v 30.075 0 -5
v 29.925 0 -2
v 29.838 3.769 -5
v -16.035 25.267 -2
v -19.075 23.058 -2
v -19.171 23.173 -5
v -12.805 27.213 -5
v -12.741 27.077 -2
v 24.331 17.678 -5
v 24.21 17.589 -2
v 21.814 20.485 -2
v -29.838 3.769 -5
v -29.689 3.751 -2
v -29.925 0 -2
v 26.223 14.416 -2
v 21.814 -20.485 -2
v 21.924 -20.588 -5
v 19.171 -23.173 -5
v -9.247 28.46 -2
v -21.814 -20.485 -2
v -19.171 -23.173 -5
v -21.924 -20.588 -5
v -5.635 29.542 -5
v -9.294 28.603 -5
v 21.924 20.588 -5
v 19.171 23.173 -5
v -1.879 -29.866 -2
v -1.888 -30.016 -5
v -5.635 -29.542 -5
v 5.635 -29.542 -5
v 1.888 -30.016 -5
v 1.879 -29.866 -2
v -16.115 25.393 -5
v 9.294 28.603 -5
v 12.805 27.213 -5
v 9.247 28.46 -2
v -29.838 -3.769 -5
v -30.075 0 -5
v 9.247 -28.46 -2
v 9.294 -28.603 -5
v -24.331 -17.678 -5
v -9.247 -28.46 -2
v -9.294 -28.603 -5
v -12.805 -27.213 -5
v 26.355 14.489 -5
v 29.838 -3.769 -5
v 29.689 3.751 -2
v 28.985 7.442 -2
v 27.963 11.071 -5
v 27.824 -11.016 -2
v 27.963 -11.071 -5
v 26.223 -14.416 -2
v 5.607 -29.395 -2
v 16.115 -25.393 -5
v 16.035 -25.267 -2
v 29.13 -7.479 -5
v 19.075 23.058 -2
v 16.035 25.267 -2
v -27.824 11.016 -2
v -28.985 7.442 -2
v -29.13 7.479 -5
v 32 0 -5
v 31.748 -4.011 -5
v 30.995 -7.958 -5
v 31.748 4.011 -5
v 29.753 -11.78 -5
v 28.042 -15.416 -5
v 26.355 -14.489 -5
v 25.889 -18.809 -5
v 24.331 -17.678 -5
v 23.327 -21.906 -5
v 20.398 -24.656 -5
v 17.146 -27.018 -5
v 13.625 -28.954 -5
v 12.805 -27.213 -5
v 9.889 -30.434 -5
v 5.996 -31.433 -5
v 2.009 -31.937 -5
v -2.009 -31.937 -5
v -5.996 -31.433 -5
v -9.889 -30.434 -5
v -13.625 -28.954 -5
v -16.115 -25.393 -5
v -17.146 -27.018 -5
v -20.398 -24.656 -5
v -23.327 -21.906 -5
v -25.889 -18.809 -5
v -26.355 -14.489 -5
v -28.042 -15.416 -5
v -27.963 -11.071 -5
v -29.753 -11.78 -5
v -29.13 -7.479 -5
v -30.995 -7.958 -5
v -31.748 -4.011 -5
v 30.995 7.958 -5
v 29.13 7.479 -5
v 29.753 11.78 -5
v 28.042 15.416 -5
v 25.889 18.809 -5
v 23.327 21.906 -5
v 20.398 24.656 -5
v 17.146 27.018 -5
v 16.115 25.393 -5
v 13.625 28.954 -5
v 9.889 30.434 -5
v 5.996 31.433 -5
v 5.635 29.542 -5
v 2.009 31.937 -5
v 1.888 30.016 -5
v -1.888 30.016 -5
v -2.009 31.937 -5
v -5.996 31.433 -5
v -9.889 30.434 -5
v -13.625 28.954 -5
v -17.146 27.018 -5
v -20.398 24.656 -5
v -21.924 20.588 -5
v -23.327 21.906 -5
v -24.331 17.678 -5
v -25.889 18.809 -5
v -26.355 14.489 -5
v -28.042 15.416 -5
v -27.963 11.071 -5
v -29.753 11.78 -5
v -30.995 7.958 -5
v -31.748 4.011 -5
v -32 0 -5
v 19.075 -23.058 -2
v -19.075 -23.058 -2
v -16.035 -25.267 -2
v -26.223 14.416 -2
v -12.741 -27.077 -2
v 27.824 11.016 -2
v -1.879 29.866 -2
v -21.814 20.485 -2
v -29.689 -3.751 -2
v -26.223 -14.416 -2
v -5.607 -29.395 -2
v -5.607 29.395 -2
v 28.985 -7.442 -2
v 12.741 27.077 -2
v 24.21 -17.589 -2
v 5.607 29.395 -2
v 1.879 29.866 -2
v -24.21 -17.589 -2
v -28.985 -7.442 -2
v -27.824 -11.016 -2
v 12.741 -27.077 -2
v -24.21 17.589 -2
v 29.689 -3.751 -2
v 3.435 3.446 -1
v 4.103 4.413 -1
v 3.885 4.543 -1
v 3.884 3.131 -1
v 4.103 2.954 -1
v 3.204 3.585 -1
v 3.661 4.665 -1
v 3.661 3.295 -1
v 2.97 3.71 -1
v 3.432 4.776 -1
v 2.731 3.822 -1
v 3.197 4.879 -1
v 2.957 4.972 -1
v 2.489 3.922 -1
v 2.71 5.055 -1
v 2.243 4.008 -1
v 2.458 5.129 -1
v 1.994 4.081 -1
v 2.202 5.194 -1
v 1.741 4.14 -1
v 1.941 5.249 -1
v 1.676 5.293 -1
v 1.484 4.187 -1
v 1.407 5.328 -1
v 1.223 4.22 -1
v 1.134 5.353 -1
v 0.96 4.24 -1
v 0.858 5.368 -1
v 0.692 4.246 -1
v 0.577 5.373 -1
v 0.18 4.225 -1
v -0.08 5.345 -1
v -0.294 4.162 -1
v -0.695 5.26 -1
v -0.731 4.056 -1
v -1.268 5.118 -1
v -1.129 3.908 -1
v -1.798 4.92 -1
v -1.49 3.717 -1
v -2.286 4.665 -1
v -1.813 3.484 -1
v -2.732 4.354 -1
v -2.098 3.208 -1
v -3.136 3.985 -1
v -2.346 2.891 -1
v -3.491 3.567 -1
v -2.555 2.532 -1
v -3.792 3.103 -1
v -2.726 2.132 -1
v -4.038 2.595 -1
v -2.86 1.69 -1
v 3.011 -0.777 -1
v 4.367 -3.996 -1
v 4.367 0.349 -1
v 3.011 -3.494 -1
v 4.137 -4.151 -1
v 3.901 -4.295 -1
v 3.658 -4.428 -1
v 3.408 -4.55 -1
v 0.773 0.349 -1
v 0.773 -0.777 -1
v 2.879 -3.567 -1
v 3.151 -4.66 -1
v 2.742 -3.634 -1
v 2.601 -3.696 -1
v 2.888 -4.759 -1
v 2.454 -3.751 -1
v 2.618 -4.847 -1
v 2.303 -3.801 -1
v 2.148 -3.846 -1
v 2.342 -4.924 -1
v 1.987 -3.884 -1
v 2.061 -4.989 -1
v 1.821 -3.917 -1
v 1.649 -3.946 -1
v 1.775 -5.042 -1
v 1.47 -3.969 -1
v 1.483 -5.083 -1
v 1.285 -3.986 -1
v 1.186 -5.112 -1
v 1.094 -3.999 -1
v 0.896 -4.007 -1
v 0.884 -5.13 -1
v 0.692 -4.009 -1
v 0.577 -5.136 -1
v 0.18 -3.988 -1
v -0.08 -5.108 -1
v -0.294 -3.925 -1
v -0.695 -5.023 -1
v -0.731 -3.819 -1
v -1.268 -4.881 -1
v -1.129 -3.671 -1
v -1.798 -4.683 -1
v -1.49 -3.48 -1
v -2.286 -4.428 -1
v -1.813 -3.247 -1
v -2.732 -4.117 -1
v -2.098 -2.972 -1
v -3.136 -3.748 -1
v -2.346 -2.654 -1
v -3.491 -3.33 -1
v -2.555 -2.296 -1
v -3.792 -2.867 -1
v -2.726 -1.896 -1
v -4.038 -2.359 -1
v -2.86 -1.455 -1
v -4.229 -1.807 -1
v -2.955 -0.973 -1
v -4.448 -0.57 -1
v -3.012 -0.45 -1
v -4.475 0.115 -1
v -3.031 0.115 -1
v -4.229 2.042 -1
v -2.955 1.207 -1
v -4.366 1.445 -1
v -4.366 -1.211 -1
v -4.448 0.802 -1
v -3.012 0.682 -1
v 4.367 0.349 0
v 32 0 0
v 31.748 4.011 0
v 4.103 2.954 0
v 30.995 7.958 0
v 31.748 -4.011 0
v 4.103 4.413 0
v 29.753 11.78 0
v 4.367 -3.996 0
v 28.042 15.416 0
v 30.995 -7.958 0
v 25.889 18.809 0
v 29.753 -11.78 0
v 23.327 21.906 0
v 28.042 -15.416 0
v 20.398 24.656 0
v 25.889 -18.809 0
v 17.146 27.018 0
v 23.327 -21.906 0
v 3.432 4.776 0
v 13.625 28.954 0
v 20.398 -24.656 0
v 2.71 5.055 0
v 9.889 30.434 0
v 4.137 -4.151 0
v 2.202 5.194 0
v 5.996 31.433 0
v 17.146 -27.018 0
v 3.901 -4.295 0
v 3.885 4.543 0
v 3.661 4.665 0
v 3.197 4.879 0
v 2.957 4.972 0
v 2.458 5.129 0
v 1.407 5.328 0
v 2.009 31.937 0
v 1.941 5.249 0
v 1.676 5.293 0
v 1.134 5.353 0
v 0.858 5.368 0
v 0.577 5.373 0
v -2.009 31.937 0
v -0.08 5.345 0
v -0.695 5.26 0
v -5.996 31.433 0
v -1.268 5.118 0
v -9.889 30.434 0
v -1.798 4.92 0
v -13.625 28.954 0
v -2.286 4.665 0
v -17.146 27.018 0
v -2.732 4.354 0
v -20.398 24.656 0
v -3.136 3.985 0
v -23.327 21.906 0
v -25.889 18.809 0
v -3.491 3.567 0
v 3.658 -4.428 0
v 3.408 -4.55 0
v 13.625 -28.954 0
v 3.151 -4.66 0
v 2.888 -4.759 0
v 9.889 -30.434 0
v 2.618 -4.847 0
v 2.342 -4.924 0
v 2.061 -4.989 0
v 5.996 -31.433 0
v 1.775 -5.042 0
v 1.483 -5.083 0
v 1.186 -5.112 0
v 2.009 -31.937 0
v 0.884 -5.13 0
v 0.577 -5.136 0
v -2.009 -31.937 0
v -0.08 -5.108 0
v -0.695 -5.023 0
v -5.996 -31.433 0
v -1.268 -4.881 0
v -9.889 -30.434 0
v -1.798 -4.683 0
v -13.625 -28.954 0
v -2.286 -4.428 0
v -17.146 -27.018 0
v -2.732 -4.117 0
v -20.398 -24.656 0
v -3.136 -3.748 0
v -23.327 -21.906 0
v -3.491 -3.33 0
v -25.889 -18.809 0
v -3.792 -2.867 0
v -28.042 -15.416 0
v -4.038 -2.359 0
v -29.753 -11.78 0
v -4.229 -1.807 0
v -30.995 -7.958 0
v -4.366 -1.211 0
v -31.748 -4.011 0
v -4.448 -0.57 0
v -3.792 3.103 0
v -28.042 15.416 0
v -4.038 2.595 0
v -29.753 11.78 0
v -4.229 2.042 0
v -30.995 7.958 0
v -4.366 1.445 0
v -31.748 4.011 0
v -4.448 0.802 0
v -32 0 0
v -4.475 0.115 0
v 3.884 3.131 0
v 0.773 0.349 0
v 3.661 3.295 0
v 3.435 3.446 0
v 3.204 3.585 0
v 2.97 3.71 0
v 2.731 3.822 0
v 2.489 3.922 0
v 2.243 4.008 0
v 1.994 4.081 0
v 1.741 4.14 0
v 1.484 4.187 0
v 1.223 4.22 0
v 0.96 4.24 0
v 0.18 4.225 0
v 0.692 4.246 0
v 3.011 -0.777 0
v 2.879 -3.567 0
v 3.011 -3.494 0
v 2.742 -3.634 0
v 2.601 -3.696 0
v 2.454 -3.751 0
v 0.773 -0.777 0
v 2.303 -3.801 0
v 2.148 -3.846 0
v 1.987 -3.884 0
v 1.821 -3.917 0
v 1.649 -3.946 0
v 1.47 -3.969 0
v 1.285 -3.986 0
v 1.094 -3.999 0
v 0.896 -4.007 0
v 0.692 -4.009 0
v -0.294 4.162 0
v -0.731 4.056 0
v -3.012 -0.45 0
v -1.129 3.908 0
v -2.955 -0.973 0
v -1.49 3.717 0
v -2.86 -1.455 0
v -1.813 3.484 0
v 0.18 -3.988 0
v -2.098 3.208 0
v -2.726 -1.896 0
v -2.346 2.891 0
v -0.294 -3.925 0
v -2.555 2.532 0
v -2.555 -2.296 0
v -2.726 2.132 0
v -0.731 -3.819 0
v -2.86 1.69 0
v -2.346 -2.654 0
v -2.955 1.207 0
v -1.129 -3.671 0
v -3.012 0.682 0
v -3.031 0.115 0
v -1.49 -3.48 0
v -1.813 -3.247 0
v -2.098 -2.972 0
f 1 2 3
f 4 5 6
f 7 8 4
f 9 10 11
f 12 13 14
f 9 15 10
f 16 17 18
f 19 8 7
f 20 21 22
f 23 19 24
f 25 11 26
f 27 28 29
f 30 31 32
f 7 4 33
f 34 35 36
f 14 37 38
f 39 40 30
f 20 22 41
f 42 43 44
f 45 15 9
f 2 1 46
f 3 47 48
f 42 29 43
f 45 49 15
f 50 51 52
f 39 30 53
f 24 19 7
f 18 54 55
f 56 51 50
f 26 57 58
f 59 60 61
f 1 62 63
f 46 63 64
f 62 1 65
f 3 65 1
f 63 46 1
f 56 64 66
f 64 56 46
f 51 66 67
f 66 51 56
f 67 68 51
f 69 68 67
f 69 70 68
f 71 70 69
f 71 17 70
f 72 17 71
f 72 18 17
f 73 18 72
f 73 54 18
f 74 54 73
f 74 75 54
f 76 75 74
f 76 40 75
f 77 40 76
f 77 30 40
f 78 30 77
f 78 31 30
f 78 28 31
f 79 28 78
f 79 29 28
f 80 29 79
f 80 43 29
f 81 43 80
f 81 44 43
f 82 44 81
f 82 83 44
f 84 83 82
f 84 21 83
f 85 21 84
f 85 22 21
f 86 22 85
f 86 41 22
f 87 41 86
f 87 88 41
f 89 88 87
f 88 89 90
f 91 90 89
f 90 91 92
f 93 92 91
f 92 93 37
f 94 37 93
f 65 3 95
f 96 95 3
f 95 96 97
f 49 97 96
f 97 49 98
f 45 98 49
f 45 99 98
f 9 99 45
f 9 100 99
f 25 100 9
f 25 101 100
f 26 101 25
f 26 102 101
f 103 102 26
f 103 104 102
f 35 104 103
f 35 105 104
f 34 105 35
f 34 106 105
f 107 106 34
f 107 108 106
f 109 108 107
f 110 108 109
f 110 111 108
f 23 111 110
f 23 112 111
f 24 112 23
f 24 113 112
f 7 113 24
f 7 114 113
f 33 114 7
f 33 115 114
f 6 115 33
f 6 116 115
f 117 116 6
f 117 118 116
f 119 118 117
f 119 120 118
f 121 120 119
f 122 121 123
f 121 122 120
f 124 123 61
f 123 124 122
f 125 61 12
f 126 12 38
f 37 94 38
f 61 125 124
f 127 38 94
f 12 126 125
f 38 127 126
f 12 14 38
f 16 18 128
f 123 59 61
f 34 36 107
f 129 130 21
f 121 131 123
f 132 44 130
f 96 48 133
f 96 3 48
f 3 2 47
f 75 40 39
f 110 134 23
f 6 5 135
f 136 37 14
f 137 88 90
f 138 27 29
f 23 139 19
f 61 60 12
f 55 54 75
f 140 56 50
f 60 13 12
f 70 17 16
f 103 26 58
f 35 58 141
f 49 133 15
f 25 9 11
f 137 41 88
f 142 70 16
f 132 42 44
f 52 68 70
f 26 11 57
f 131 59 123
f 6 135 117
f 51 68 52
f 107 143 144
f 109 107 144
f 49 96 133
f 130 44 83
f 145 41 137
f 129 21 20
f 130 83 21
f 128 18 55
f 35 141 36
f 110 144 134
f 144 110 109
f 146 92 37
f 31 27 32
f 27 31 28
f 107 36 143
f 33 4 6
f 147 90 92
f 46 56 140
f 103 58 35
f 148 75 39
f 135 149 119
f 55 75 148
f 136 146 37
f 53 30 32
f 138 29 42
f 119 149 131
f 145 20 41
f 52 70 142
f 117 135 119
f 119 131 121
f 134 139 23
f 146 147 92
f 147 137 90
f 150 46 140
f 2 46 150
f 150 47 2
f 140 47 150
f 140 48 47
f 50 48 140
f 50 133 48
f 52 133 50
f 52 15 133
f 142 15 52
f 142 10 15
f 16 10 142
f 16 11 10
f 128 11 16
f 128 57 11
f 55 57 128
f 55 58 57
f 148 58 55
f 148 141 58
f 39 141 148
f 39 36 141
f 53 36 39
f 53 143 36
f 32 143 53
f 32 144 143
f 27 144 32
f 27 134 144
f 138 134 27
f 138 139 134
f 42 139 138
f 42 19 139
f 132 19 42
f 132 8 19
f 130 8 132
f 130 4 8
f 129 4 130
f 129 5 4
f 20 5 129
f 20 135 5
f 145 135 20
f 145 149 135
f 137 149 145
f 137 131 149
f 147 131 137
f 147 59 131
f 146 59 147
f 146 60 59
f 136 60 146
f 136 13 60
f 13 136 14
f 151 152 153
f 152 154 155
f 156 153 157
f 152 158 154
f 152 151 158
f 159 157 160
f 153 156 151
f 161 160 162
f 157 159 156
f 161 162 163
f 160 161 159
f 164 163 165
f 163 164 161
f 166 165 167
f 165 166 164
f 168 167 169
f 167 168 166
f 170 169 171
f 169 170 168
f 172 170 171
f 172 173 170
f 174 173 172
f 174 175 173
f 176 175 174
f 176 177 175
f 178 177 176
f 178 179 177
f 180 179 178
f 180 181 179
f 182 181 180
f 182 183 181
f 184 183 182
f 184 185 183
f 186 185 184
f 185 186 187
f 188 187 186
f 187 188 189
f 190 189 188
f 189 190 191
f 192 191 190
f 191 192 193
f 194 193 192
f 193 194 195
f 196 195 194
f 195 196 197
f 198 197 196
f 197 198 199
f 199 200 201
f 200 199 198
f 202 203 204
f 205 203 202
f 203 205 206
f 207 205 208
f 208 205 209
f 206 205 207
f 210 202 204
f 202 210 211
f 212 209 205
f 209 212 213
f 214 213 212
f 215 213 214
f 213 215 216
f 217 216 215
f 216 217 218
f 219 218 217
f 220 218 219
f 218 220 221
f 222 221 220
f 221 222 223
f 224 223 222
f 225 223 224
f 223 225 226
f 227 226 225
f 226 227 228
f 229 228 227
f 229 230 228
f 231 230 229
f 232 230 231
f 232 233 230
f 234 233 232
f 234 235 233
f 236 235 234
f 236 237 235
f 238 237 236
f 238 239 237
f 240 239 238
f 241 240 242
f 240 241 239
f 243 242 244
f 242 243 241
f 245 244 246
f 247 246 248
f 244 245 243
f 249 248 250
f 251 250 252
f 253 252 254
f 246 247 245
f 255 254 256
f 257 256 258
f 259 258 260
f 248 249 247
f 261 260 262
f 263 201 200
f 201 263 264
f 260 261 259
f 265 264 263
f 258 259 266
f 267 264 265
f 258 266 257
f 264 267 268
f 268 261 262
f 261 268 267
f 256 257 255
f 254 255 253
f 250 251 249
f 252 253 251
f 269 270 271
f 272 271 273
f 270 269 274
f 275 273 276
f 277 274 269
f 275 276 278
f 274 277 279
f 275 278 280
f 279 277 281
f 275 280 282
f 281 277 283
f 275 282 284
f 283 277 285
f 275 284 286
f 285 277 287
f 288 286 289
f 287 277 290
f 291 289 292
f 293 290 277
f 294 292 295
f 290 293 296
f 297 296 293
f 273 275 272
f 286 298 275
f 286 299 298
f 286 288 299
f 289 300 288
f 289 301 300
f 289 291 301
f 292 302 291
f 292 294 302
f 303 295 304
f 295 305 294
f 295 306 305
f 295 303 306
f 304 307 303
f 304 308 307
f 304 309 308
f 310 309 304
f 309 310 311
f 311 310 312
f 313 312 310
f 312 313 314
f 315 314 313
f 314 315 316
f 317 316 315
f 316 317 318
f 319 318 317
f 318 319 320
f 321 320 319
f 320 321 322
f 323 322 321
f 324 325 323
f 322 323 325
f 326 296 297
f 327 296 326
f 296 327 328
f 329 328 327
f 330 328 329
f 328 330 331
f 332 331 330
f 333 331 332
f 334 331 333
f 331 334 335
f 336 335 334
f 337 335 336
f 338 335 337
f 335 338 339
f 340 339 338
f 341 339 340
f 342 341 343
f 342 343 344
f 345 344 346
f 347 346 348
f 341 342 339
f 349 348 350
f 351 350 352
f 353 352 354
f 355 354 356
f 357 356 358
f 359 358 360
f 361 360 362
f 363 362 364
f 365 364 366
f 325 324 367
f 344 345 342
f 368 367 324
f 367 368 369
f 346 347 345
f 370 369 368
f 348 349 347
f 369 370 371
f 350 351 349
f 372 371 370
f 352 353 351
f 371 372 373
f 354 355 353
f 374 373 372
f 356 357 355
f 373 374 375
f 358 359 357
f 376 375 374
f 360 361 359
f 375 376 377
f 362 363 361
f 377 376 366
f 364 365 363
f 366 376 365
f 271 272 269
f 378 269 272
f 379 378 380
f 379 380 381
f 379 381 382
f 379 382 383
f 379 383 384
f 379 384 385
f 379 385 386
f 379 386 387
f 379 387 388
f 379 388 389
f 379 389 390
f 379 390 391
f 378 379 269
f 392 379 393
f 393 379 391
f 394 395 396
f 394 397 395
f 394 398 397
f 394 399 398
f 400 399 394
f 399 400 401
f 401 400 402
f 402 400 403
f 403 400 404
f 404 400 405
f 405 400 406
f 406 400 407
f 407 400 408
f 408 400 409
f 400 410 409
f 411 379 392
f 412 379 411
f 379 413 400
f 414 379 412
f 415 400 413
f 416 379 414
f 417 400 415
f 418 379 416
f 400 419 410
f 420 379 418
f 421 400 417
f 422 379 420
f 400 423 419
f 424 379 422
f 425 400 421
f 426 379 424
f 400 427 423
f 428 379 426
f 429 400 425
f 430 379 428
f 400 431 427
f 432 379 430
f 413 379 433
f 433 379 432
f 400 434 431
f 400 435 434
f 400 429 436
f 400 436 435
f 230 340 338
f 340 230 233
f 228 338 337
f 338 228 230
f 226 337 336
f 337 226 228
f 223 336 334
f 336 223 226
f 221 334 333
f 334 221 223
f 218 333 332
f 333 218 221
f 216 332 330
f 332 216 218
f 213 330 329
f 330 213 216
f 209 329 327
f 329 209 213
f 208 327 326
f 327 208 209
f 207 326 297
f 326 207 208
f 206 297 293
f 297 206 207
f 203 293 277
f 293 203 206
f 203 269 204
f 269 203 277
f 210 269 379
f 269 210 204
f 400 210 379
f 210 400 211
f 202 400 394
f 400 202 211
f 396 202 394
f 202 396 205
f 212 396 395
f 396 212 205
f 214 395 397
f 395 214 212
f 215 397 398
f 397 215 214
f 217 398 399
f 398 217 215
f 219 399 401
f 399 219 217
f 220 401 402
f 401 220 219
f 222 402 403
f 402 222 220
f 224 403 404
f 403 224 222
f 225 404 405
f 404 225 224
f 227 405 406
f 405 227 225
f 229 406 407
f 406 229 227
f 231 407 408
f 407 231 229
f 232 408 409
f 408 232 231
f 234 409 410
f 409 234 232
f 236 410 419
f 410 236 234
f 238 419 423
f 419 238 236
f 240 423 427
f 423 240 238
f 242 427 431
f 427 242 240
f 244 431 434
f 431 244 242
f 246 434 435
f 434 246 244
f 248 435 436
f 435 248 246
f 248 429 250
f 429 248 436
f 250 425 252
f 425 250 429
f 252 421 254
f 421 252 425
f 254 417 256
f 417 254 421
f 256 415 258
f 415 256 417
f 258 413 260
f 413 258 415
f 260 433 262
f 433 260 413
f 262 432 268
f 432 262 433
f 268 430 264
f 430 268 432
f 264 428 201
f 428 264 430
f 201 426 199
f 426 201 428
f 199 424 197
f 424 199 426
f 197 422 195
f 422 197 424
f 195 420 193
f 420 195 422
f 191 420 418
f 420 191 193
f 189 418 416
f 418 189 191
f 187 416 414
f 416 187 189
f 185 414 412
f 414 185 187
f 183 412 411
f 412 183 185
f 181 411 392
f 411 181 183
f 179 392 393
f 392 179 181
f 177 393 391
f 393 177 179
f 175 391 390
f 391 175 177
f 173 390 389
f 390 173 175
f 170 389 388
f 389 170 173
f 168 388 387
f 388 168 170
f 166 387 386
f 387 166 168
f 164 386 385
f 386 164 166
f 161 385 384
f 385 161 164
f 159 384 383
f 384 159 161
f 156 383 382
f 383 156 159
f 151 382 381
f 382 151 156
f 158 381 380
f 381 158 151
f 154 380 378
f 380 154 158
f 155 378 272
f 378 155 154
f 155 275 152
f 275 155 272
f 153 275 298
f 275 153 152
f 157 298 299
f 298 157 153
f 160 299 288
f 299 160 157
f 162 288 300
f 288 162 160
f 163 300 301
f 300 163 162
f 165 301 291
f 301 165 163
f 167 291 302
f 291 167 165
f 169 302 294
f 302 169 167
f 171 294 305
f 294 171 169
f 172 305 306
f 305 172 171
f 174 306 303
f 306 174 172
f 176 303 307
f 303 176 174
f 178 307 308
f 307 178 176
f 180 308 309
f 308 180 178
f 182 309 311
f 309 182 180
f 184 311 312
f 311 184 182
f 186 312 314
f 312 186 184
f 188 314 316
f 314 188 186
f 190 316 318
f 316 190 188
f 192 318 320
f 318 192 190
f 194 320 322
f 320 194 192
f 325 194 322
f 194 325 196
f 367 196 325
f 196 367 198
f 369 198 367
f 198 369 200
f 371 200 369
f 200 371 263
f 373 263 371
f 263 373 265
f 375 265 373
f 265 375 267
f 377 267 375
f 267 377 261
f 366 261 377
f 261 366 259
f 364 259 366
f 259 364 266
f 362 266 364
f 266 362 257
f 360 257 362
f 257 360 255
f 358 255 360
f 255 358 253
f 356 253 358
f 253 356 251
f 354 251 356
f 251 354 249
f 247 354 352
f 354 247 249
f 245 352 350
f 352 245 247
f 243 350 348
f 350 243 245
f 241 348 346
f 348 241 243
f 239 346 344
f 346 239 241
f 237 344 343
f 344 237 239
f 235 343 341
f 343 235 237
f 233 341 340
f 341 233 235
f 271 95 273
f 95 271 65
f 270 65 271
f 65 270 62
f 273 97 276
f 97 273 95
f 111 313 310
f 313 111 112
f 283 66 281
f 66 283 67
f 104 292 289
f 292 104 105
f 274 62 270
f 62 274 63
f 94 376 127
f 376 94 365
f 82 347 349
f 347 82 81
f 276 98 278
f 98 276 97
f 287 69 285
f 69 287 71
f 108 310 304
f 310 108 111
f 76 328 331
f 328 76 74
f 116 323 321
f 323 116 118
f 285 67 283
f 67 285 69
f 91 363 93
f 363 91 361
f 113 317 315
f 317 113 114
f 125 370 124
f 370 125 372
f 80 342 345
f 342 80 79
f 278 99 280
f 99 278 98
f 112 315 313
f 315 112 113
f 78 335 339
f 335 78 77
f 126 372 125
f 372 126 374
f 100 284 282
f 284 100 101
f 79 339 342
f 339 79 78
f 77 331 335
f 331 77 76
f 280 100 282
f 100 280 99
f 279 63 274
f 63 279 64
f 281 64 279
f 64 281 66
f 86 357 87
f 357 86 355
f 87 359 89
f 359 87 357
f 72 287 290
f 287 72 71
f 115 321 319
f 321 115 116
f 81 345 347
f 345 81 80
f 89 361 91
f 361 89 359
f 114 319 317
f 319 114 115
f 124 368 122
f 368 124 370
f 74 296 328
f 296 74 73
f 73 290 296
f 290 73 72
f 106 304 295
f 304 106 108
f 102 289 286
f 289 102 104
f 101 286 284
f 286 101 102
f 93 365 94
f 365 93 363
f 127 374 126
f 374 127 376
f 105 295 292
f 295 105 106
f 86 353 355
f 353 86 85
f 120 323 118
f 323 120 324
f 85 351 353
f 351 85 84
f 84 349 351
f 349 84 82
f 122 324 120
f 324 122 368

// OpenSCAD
$fn = 50;

difference() {
	union() {
		translate(v = [0, 0, -5.0]) {
			cylinder(h = 5, r = 32.0);
		}
	}
	union() {
		#translate(v = [0, 0, -5.0]) {
			cylinder(h = 3, r1 = 30.075, r2 = 29.925);
		}
		translate(v = [0, 0, -1]) {
			linear_extrude(height = 1) {
				text(font = "Impact", halign = "center", size = 10, text = "G", valign = "center");
			}
		}
	}
}
